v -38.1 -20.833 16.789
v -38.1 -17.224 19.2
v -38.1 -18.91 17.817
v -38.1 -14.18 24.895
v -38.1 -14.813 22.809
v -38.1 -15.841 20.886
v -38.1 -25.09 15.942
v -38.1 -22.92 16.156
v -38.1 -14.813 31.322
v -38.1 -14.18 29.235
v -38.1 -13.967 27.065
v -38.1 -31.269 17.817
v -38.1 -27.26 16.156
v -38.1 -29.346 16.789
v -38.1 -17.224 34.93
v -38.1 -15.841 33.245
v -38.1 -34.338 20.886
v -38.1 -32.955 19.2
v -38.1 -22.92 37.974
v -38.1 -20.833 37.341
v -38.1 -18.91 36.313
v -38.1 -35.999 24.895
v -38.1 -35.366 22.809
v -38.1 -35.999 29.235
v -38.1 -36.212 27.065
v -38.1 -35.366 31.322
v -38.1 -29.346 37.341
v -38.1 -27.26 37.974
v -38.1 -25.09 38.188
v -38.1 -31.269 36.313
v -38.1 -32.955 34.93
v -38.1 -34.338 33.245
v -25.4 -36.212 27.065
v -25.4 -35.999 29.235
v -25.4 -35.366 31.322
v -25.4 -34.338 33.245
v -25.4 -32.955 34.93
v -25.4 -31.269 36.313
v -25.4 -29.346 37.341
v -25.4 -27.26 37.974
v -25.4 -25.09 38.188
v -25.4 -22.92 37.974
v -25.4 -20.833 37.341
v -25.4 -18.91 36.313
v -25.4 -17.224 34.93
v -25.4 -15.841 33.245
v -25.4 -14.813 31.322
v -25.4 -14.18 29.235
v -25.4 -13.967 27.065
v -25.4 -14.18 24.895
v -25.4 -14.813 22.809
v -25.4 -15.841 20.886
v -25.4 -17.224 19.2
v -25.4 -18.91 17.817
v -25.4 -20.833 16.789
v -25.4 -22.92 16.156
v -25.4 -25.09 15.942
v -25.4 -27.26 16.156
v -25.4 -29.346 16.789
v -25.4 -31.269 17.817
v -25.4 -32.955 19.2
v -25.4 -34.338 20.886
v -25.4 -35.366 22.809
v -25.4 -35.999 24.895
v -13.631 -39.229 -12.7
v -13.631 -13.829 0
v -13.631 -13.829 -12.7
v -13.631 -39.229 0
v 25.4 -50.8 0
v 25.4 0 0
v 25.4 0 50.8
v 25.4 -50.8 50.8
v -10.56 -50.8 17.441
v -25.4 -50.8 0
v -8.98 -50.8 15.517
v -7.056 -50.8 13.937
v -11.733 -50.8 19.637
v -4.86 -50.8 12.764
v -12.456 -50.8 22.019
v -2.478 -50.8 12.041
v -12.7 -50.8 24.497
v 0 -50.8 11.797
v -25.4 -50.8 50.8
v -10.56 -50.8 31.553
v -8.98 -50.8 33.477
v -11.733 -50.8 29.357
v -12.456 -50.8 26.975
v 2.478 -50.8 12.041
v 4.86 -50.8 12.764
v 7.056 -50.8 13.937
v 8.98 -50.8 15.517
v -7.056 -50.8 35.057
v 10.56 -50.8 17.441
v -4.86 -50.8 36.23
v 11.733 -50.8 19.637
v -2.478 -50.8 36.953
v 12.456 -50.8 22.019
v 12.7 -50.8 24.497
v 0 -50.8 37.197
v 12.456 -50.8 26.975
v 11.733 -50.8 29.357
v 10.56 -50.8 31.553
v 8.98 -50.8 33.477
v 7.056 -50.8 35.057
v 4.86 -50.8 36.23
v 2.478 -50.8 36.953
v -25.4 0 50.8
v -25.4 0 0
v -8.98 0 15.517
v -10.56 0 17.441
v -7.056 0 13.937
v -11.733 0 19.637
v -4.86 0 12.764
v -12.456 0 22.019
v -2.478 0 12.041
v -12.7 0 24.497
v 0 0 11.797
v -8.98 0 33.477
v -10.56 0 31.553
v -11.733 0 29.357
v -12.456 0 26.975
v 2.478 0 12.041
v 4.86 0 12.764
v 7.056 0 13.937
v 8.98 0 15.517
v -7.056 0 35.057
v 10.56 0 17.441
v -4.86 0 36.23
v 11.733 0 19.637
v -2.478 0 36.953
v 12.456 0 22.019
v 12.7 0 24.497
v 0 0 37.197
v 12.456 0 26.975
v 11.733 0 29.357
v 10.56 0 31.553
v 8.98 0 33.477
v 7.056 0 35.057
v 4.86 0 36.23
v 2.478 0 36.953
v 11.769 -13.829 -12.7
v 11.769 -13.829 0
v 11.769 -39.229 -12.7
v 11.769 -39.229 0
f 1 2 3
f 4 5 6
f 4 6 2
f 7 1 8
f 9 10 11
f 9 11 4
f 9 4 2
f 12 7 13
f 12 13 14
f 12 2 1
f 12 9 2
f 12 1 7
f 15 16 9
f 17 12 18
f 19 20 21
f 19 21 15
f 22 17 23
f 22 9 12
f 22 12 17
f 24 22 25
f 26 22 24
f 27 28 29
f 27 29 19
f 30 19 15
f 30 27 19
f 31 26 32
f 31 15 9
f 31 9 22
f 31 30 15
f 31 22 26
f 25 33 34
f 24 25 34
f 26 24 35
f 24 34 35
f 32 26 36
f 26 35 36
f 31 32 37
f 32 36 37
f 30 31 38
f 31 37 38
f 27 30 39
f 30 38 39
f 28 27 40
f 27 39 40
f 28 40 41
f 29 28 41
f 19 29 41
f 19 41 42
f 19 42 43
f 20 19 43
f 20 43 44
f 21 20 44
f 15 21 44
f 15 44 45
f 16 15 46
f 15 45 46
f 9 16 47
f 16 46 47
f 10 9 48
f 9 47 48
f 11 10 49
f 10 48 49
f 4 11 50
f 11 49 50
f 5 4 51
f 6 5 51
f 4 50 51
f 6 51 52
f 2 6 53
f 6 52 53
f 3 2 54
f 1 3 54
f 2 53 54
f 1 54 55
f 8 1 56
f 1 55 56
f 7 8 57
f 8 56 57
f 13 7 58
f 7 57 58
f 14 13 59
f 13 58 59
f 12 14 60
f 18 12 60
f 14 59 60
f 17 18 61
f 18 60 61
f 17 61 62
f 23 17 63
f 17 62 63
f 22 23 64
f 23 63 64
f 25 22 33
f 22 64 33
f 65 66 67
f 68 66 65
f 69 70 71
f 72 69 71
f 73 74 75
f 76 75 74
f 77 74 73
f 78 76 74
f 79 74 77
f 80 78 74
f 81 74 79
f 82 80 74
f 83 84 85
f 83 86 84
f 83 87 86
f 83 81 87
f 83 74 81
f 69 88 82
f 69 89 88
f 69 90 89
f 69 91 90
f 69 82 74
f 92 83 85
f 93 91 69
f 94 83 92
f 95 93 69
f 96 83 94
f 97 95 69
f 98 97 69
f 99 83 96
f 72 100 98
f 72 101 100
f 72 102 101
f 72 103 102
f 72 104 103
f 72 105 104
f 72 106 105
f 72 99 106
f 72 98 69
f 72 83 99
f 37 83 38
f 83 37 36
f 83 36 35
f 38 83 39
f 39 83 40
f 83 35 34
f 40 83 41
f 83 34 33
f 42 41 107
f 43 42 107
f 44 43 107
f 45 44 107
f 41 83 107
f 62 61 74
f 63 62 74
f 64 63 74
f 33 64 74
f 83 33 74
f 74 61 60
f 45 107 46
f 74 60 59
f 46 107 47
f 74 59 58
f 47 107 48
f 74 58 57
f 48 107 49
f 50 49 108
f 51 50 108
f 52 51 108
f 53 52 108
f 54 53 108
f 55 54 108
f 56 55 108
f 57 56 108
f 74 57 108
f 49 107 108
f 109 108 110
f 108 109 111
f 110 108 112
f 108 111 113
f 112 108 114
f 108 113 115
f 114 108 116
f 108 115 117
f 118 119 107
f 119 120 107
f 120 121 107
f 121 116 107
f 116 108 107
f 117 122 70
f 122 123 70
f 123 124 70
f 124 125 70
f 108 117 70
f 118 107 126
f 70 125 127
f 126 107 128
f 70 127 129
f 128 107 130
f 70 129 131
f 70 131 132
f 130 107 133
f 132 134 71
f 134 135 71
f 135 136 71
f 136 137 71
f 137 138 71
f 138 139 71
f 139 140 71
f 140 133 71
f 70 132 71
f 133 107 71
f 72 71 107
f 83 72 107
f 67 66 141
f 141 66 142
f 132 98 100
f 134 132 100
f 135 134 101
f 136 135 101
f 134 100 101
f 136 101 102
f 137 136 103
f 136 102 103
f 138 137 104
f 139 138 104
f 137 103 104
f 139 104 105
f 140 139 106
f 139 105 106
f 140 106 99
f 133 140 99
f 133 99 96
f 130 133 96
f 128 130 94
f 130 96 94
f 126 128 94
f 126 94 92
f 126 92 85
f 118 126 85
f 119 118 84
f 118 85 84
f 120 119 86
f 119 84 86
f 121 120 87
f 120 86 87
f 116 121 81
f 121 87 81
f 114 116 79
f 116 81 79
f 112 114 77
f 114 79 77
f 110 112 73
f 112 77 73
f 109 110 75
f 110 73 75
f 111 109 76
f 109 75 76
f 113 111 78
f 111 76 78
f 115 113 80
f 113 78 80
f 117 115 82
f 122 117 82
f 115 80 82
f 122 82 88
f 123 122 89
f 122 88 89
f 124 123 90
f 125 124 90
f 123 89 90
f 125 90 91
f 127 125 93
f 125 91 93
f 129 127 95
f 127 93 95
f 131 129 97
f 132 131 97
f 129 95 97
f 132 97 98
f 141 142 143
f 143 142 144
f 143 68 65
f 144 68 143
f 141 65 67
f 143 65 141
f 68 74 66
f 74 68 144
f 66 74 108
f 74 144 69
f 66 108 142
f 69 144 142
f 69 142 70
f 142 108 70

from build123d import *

# Parameters (mm, degrees)
F1_DEPTH = 50.8
F2_R     = 12.7
F3_DEPTH = 50.8
F4_W     = 25.4
F4_H     = 25.4
F5_DEPTH = 12.7
F6_R     = 11.122921
F7_DEPTH = 12.7


with BuildPart() as f1:
    # F0 (on Front) → F1 (new body)
    with BuildSketch(Plane.XZ):
        Polygon((-25.4, 0), (0, 0), (25.4, 0), (25.4, 50.8), (-25.4, 50.8), align=None)
    extrude(amount=F1_DEPTH)

    # F2 (on face) → F3 (cut)
    with BuildSketch(Plane.XZ.offset(50.8)):
        with Locations((0, 24.496891)):
            Circle(F2_R)
    extrude(amount=-F3_DEPTH, mode=Mode.SUBTRACT)

    # F4 (on face) → F5 (join)
    with BuildSketch(Plane(origin=(0, 0, 0), x_dir=(1, 0, 0), z_dir=(0, 0, -1))):
        with Locations((-0.931334, 26.528889)):
            Rectangle(F4_W, F4_H)
    extrude(amount=F5_DEPTH)

    # F6 (on face) → F7 (join)
    with BuildSketch(Plane(origin=(-25.4, 0, 0), x_dir=(0, -1, 0), z_dir=(-1, 0, 0))):
        with Locations((25.089554, 27.065113)):
            Circle(F6_R)
    extrude(amount=F7_DEPTH)


solid = f1.part
